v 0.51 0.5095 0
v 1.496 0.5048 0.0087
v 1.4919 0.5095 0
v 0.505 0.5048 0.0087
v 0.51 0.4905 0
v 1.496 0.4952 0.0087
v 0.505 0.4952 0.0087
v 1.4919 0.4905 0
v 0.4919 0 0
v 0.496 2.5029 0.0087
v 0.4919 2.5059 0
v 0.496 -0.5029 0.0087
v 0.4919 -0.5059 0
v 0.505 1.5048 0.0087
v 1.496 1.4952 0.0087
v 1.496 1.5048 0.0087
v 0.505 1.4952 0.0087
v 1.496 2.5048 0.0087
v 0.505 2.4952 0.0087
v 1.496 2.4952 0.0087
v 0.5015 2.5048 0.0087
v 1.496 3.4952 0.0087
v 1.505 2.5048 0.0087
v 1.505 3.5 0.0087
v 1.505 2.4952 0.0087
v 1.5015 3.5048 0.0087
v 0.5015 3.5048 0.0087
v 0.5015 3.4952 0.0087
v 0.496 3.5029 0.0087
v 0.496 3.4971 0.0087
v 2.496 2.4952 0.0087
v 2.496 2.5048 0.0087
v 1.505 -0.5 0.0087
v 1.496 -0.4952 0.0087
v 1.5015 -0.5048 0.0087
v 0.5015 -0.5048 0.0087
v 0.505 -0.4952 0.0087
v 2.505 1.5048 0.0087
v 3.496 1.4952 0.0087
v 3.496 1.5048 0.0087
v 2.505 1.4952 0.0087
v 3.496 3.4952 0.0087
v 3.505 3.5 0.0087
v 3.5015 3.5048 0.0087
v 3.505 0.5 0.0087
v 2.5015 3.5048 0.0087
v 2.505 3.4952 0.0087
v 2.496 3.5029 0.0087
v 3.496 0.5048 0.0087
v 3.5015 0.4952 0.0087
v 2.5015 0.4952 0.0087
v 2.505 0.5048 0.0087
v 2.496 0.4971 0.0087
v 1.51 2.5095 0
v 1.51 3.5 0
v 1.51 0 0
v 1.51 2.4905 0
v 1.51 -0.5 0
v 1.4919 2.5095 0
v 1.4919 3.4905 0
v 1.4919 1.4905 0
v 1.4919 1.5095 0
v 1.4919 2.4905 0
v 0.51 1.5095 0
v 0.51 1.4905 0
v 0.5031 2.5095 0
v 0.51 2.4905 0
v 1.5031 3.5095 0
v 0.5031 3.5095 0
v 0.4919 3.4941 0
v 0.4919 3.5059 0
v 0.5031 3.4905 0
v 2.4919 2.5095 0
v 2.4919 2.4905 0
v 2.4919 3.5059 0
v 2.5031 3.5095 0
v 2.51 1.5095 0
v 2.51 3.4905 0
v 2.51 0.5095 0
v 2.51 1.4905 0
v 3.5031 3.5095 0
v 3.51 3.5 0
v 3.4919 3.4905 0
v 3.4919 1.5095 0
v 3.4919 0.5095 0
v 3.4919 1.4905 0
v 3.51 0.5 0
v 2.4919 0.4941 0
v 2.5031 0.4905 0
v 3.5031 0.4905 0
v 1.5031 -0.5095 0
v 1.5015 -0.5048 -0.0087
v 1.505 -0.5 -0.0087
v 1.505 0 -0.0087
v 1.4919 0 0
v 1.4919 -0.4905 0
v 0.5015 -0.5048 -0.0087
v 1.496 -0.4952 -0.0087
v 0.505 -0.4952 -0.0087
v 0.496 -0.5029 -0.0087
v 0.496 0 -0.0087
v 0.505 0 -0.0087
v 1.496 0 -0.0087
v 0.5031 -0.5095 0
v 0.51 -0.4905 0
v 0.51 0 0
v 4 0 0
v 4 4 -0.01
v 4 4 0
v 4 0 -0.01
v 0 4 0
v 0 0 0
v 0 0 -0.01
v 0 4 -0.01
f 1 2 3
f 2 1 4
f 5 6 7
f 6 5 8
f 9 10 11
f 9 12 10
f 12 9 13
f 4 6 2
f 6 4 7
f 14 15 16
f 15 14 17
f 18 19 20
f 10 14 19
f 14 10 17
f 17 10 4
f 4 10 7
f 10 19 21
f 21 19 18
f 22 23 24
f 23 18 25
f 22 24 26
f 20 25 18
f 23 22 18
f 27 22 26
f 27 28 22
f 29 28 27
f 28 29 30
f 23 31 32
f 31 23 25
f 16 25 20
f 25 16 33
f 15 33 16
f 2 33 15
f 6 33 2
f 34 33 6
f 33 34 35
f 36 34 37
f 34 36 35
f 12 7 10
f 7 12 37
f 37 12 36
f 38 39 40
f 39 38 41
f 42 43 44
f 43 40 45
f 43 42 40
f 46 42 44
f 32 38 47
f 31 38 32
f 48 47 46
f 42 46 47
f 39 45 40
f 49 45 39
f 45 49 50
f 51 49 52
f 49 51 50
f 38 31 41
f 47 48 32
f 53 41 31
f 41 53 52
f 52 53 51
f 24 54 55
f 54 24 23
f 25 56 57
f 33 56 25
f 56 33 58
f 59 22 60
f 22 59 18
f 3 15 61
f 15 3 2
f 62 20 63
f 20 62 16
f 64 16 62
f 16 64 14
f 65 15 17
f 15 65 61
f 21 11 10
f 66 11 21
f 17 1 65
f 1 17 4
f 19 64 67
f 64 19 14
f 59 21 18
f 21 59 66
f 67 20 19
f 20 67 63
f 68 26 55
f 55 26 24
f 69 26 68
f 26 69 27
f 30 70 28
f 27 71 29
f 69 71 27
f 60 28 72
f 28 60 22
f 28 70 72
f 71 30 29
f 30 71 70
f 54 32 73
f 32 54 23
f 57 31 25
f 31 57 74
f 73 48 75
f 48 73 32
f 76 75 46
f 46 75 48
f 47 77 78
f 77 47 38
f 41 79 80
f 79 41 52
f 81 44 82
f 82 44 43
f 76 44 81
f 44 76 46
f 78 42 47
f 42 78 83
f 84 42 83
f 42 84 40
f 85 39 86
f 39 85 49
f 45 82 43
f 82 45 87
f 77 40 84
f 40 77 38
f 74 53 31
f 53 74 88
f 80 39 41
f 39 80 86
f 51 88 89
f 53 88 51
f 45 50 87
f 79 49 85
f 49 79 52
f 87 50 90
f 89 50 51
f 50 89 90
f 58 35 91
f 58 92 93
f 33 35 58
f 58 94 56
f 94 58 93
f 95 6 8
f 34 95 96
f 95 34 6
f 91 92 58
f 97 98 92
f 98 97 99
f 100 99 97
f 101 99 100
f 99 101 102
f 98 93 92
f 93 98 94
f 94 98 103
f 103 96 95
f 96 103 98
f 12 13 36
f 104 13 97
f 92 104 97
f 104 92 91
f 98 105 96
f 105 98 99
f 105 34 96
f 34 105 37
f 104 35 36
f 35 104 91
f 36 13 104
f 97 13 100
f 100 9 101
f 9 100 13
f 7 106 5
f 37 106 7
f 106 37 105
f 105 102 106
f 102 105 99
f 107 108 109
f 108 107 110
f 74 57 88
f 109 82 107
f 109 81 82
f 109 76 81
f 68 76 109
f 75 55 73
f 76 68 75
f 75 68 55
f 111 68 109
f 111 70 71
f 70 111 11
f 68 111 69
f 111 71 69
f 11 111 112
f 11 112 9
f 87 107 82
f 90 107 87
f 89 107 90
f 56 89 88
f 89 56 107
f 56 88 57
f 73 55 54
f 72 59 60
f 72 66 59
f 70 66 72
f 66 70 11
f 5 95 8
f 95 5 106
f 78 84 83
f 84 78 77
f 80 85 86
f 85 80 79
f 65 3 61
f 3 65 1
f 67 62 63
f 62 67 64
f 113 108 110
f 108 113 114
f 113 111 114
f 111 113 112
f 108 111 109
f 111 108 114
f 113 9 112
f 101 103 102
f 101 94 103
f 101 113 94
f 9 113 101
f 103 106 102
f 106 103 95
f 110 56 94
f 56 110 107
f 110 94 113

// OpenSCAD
hull(){
    translate([0.5, 0.5]) sphere(0.01);
    translate([1.5, 0.5]) sphere(0.01);
}
hull(){
    translate([1.5, 0.5]) sphere(0.01);
    translate([1.5, 1.5]) sphere(0.01);
}
hull(){
    translate([1.5, 1.5]) sphere(0.01);
    translate([0.5, 1.5]) sphere(0.01);
}
hull(){
    translate([0.5, 1.5]) sphere(0.01);
    translate([0.5, 2.5]) sphere(0.01);
}
hull(){
    translate([0.5, 2.5]) sphere(0.01);
    translate([1.5, 2.5]) sphere(0.01);
}
hull(){
    translate([1.5, 2.5]) sphere(0.01);
    translate([1.5, 3.5]) sphere(0.01);
}
hull(){
    translate([1.5, 3.5]) sphere(0.01);
    translate([0.5, 3.5]) sphere(0.01);
}
hull(){
    translate([0.5, 3.5]) sphere(0.01);
    translate([1.5, 3.5]) sphere(0.01);
}
hull(){
    translate([1.5, 3.5]) sphere(0.01);
    translate([1.5, 2.5]) sphere(0.01);
}
hull(){
    translate([1.5, 2.5]) sphere(0.01);
    translate([2.5, 2.5]) sphere(0.01);
}
hull(){
    translate([2.5, 2.5]) sphere(0.01);
    translate([2.5, 3.5]) sphere(0.01);
}
hull(){
    translate([2.5, 3.5]) sphere(0.01);
    translate([3.5, 3.5]) sphere(0.01);
}
hull(){
    translate([3.5, 3.5]) sphere(0.01);
    translate([3.5, 2.5]) sphere(0.01);
}
hull(){
    translate([3.5, 2.5]) sphere(0.01);
    translate([3.5, 1.5]) sphere(0.01);
}
hull(){
    translate([3.5, 1.5]) sphere(0.01);
    translate([2.5, 1.5]) sphere(0.01);
}
hull(){
    translate([2.5, 1.5]) sphere(0.01);
    translate([2.5, 0.5]) sphere(0.01);
}
hull(){
    translate([2.5, 0.5]) sphere(0.01);
    translate([3.5, 0.5]) sphere(0.01);
}
hull(){
    translate([3.5, 0.5]) sphere(0.01);
    translate([3.5, 1.5]) sphere(0.01);
}
hull(){
    translate([3.5, 1.5]) sphere(0.01);
    translate([2.5, 1.5]) sphere(0.01);
}
hull(){
    translate([2.5, 1.5]) sphere(0.01);
    translate([2.5, 2.5]) sphere(0.01);
}
hull(){
    translate([2.5, 2.5]) sphere(0.01);
    translate([1.5, 2.5]) sphere(0.01);
}
hull(){
    translate([1.5, 2.5]) sphere(0.01);
    translate([1.5, 1.5]) sphere(0.01);
}
hull(){
    translate([1.5, 1.5]) sphere(0.01);
    translate([0.5, 1.5]) sphere(0.01);
}
hull(){
    translate([0.5, 1.5]) sphere(0.01);
    translate([0.5, 0.5]) sphere(0.01);
}
hull(){
    translate([0.5, 0.5]) sphere(0.01);
    translate([1.5, 0.5]) sphere(0.01);
}
hull(){
    translate([1.5, 0.5]) sphere(0.01);
    translate([1.5, -0.5]) sphere(0.01);
}
hull(){
    translate([1.5, -0.5]) sphere(0.01);
    translate([0.5, -0.5]) sphere(0.01);
}
hull(){
    translate([0.5, -0.5]) sphere(0.01);
    translate([0.5, 0.5]) sphere(0.01);
}
translate([0,0,-0.01]) color([0.1,0.1,0.1]) cube([4,4,0.01]);
